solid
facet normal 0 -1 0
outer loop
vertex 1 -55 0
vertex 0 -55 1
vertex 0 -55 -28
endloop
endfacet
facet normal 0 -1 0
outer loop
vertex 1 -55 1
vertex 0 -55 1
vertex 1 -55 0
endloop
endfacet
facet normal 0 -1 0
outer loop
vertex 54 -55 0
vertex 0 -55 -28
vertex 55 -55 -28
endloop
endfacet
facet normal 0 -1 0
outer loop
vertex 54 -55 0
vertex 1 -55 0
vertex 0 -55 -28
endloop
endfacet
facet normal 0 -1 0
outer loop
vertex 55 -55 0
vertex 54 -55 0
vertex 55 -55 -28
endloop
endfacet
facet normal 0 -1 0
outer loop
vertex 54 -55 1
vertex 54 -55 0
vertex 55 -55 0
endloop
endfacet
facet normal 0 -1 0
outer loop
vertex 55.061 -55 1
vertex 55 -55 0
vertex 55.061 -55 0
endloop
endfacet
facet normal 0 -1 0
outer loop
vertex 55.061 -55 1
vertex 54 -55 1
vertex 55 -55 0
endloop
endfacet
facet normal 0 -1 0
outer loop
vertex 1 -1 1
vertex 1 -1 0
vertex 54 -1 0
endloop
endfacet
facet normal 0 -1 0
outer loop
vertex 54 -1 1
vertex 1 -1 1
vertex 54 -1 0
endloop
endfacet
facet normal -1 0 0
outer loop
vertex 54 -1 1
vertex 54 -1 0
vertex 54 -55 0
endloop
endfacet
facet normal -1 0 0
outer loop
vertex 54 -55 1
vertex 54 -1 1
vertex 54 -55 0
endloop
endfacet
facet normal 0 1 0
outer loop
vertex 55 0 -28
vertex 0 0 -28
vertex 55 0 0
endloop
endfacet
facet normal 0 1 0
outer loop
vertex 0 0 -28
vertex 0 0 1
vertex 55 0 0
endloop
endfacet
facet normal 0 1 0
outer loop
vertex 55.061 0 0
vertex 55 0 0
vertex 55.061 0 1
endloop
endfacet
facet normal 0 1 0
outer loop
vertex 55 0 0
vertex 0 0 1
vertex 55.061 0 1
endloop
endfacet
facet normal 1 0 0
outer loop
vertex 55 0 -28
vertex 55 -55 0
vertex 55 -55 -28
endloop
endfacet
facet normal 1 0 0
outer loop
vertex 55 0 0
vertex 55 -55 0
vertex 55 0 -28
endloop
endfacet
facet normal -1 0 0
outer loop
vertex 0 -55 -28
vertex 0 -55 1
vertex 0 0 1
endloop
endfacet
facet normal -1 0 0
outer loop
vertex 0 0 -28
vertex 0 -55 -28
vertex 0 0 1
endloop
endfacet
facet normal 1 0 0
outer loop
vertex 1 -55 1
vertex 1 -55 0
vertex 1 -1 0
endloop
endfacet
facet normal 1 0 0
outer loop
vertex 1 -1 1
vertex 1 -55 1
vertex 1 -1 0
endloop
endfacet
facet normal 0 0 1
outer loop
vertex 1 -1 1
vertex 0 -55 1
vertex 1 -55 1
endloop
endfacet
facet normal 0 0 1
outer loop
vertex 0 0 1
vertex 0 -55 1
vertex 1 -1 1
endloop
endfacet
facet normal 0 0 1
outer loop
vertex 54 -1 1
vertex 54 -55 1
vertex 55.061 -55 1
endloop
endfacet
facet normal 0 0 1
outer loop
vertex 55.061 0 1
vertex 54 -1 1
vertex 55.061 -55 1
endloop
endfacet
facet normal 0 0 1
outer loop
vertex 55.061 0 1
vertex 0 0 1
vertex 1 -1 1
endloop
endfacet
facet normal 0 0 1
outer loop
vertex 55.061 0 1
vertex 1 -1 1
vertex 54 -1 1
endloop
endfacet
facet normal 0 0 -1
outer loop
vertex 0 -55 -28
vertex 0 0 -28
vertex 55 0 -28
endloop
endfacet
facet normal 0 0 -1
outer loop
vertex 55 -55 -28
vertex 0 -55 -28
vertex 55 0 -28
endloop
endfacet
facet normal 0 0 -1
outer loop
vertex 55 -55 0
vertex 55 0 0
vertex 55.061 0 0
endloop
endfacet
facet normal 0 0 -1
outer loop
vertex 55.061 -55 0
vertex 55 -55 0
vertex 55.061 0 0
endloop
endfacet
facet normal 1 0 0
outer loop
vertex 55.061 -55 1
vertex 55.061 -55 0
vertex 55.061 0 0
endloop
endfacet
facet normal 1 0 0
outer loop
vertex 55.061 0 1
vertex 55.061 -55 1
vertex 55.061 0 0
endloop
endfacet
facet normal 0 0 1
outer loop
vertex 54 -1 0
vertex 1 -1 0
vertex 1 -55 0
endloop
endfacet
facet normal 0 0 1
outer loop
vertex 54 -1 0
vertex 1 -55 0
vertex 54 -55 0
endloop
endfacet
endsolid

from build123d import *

# Parameters (mm, degrees)
F2_DEPTH = 1
F0_W     = 55
F0_H     = 55
F3_DEPTH = 28


with BuildPart() as f2:
    # F1 (on face) → F2 (new body)
    with BuildSketch(Plane.XY):
        Polygon((1, -1), (54, -1), (54, -55), (55.060755, -55), (55.060755, 0), (0, 0), (0, -55), (1, -55), align=None)
    extrude(amount=F2_DEPTH)

    # F0 (on Top) → F3 (join)
    with BuildSketch(Plane.XY):
        with Locations((27.5, -27.5)):
            Rectangle(F0_W, F0_H)
    extrude(amount=-F3_DEPTH)


solid = f2.part
